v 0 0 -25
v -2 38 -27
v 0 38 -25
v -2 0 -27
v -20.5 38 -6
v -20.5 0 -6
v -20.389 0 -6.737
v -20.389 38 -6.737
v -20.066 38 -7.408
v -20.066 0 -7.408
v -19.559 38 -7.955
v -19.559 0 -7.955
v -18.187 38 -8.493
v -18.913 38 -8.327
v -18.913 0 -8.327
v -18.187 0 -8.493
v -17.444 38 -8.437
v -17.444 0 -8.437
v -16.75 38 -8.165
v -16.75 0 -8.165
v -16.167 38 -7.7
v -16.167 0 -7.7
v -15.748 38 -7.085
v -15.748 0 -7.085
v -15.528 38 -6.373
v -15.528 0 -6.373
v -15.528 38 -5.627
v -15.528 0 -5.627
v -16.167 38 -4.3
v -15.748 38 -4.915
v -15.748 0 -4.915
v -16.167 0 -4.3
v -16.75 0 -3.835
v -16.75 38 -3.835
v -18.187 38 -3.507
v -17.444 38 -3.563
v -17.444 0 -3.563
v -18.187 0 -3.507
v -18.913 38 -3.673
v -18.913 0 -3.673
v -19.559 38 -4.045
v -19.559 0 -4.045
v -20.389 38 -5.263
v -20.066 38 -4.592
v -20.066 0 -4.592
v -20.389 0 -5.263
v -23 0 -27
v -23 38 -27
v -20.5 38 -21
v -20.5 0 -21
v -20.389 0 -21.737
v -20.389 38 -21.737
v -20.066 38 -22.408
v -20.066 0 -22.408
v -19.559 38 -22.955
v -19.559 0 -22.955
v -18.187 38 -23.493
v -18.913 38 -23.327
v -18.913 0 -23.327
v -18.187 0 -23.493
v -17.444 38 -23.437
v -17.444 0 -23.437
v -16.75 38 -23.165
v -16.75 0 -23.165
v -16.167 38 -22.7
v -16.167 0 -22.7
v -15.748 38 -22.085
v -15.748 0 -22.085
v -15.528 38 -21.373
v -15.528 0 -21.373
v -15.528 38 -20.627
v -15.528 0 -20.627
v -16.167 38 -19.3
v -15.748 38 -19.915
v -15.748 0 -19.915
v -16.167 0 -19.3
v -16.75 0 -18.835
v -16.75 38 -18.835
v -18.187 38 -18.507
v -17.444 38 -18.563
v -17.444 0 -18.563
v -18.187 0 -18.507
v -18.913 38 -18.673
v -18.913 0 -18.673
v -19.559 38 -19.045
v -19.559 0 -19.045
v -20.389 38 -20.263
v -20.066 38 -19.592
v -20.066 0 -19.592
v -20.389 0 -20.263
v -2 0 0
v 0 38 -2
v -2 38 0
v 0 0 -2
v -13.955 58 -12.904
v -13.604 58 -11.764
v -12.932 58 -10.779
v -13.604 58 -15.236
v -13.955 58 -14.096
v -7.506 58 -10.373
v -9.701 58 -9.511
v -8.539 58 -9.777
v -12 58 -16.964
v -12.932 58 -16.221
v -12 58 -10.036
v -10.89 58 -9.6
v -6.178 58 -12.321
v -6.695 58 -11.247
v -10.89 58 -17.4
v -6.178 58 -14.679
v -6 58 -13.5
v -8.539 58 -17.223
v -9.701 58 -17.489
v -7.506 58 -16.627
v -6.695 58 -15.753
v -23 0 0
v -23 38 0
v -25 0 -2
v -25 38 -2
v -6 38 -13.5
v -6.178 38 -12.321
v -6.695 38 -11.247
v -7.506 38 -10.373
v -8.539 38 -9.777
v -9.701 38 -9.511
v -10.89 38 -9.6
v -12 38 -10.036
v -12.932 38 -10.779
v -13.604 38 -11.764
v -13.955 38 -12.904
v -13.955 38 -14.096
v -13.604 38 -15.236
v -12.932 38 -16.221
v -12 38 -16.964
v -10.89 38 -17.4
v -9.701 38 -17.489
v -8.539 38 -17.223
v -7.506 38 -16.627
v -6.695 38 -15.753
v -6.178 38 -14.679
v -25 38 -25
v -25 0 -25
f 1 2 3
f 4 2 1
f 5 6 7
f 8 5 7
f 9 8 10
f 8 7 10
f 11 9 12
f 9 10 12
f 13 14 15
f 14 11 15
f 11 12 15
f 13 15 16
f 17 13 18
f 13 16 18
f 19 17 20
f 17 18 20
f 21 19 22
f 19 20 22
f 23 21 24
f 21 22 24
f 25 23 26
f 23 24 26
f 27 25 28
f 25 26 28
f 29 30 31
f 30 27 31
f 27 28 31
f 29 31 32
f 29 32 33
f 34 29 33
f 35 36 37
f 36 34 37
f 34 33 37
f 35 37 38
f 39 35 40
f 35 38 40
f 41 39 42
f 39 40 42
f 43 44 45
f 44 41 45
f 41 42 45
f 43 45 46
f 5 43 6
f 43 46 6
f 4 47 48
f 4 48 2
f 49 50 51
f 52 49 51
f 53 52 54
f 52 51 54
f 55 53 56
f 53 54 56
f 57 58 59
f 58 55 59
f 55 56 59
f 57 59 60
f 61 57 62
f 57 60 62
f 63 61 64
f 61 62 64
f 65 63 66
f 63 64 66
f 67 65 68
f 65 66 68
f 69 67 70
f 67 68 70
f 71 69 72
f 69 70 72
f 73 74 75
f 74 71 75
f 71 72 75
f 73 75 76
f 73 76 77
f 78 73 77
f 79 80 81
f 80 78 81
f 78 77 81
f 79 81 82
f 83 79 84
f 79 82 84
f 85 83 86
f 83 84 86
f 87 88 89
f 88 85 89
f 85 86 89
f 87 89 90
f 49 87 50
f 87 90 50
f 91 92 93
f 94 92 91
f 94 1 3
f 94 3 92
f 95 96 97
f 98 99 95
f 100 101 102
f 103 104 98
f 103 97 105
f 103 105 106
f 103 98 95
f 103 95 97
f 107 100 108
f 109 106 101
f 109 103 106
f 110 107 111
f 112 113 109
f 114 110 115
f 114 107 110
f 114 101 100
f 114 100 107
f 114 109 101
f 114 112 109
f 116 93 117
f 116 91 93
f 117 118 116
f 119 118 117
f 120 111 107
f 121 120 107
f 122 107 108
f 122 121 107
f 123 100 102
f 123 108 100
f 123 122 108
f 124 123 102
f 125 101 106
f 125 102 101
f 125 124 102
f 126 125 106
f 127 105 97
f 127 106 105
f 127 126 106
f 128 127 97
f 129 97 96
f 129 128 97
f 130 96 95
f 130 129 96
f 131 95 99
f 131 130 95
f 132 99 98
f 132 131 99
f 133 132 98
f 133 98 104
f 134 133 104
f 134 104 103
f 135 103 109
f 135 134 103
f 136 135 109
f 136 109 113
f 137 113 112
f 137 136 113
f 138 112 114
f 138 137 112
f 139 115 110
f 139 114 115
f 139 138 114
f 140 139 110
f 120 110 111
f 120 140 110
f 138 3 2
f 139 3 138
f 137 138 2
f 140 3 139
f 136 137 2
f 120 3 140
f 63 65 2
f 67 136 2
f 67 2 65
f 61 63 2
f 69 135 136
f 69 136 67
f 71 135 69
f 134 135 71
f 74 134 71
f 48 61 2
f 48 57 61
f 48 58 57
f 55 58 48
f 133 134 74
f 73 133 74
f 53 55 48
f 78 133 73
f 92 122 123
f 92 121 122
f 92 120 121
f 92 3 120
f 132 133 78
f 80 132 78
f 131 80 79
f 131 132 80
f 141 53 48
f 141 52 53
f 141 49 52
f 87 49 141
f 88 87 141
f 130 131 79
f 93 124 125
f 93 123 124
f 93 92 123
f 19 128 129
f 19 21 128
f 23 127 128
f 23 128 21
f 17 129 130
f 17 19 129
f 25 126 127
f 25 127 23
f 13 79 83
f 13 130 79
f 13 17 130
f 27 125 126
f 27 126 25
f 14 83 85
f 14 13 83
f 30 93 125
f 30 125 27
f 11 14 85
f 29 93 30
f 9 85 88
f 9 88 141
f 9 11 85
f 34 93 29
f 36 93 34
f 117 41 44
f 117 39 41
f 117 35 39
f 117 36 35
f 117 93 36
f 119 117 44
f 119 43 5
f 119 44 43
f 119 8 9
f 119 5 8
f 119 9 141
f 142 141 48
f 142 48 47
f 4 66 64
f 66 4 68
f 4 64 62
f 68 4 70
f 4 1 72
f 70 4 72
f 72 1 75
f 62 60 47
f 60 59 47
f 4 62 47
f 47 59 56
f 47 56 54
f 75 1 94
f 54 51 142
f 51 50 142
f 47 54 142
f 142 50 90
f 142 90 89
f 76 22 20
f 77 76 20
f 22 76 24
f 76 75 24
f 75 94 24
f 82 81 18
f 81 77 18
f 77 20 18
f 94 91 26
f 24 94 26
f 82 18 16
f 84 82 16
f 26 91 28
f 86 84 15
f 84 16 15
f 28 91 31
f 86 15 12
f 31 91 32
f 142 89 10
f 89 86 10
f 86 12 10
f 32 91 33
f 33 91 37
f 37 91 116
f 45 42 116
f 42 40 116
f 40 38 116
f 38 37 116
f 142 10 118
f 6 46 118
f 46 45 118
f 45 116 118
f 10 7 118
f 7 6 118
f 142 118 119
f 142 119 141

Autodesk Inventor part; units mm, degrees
ref_plane "YZ Plane" through (0, 0, 0) normal (1, 0, 0) x (0, 1, 0)
ref_plane "XZ Plane" through (0, 0, 0) normal (0, 1, 0) x (-1, 0, 0)
ref_plane "XY Plane" through (0, 0, 0) normal (0, 0, 1) x (1, 0, 0)
sketch "Sketch4" plane through (0, 0, 0) normal (0, 1, 0) x (-1, 0, 0)
  line L0 (0, 0) -> (25, 0)
  line L1 (25, 0) -> (25, -27)
  line L2 (25, -27) -> (0, -27)
  line L3 (0, -27) -> (0, 0)
  line L4 (25, 0) -> (18, 0)
  circle A0 centre (18, -6) radius 2.5
  circle A1 centre (18, -21) radius 2.5
  dimension "d35" = 25
  dimension "d36" = 27
  dimension "d39" = 5
  dimension "d41" = 5
extrude "Extrusion4" add sketch "Sketch4" along normal blind 38
sketch "Sketch5" plane through (0, 38, 0) normal (0, 1, 0) x (1, 0, 0)
  line L0 (0, 0) -> (0, 27) projected
  line L1 (0, 0) -> (0, 27)
  line L2 (0, 27) -> (0, 13.5)
  line L3 (0, 13.5) -> (-10, 13.5)
  circle A0 centre (-10, 13.5) radius 4
  dimension "d44" = 10
  dimension "d51" = 8
extrude "Extrusion5" add sketch "Sketch5" along normal blind 20
chamfer "Chamfer2" distance 2 angle 45 4 edges at (-25, 19, 0) (-25, 19, -27) (0, 19, -27) (0, 19, 0)
properties part number "pneumaticActuator"
